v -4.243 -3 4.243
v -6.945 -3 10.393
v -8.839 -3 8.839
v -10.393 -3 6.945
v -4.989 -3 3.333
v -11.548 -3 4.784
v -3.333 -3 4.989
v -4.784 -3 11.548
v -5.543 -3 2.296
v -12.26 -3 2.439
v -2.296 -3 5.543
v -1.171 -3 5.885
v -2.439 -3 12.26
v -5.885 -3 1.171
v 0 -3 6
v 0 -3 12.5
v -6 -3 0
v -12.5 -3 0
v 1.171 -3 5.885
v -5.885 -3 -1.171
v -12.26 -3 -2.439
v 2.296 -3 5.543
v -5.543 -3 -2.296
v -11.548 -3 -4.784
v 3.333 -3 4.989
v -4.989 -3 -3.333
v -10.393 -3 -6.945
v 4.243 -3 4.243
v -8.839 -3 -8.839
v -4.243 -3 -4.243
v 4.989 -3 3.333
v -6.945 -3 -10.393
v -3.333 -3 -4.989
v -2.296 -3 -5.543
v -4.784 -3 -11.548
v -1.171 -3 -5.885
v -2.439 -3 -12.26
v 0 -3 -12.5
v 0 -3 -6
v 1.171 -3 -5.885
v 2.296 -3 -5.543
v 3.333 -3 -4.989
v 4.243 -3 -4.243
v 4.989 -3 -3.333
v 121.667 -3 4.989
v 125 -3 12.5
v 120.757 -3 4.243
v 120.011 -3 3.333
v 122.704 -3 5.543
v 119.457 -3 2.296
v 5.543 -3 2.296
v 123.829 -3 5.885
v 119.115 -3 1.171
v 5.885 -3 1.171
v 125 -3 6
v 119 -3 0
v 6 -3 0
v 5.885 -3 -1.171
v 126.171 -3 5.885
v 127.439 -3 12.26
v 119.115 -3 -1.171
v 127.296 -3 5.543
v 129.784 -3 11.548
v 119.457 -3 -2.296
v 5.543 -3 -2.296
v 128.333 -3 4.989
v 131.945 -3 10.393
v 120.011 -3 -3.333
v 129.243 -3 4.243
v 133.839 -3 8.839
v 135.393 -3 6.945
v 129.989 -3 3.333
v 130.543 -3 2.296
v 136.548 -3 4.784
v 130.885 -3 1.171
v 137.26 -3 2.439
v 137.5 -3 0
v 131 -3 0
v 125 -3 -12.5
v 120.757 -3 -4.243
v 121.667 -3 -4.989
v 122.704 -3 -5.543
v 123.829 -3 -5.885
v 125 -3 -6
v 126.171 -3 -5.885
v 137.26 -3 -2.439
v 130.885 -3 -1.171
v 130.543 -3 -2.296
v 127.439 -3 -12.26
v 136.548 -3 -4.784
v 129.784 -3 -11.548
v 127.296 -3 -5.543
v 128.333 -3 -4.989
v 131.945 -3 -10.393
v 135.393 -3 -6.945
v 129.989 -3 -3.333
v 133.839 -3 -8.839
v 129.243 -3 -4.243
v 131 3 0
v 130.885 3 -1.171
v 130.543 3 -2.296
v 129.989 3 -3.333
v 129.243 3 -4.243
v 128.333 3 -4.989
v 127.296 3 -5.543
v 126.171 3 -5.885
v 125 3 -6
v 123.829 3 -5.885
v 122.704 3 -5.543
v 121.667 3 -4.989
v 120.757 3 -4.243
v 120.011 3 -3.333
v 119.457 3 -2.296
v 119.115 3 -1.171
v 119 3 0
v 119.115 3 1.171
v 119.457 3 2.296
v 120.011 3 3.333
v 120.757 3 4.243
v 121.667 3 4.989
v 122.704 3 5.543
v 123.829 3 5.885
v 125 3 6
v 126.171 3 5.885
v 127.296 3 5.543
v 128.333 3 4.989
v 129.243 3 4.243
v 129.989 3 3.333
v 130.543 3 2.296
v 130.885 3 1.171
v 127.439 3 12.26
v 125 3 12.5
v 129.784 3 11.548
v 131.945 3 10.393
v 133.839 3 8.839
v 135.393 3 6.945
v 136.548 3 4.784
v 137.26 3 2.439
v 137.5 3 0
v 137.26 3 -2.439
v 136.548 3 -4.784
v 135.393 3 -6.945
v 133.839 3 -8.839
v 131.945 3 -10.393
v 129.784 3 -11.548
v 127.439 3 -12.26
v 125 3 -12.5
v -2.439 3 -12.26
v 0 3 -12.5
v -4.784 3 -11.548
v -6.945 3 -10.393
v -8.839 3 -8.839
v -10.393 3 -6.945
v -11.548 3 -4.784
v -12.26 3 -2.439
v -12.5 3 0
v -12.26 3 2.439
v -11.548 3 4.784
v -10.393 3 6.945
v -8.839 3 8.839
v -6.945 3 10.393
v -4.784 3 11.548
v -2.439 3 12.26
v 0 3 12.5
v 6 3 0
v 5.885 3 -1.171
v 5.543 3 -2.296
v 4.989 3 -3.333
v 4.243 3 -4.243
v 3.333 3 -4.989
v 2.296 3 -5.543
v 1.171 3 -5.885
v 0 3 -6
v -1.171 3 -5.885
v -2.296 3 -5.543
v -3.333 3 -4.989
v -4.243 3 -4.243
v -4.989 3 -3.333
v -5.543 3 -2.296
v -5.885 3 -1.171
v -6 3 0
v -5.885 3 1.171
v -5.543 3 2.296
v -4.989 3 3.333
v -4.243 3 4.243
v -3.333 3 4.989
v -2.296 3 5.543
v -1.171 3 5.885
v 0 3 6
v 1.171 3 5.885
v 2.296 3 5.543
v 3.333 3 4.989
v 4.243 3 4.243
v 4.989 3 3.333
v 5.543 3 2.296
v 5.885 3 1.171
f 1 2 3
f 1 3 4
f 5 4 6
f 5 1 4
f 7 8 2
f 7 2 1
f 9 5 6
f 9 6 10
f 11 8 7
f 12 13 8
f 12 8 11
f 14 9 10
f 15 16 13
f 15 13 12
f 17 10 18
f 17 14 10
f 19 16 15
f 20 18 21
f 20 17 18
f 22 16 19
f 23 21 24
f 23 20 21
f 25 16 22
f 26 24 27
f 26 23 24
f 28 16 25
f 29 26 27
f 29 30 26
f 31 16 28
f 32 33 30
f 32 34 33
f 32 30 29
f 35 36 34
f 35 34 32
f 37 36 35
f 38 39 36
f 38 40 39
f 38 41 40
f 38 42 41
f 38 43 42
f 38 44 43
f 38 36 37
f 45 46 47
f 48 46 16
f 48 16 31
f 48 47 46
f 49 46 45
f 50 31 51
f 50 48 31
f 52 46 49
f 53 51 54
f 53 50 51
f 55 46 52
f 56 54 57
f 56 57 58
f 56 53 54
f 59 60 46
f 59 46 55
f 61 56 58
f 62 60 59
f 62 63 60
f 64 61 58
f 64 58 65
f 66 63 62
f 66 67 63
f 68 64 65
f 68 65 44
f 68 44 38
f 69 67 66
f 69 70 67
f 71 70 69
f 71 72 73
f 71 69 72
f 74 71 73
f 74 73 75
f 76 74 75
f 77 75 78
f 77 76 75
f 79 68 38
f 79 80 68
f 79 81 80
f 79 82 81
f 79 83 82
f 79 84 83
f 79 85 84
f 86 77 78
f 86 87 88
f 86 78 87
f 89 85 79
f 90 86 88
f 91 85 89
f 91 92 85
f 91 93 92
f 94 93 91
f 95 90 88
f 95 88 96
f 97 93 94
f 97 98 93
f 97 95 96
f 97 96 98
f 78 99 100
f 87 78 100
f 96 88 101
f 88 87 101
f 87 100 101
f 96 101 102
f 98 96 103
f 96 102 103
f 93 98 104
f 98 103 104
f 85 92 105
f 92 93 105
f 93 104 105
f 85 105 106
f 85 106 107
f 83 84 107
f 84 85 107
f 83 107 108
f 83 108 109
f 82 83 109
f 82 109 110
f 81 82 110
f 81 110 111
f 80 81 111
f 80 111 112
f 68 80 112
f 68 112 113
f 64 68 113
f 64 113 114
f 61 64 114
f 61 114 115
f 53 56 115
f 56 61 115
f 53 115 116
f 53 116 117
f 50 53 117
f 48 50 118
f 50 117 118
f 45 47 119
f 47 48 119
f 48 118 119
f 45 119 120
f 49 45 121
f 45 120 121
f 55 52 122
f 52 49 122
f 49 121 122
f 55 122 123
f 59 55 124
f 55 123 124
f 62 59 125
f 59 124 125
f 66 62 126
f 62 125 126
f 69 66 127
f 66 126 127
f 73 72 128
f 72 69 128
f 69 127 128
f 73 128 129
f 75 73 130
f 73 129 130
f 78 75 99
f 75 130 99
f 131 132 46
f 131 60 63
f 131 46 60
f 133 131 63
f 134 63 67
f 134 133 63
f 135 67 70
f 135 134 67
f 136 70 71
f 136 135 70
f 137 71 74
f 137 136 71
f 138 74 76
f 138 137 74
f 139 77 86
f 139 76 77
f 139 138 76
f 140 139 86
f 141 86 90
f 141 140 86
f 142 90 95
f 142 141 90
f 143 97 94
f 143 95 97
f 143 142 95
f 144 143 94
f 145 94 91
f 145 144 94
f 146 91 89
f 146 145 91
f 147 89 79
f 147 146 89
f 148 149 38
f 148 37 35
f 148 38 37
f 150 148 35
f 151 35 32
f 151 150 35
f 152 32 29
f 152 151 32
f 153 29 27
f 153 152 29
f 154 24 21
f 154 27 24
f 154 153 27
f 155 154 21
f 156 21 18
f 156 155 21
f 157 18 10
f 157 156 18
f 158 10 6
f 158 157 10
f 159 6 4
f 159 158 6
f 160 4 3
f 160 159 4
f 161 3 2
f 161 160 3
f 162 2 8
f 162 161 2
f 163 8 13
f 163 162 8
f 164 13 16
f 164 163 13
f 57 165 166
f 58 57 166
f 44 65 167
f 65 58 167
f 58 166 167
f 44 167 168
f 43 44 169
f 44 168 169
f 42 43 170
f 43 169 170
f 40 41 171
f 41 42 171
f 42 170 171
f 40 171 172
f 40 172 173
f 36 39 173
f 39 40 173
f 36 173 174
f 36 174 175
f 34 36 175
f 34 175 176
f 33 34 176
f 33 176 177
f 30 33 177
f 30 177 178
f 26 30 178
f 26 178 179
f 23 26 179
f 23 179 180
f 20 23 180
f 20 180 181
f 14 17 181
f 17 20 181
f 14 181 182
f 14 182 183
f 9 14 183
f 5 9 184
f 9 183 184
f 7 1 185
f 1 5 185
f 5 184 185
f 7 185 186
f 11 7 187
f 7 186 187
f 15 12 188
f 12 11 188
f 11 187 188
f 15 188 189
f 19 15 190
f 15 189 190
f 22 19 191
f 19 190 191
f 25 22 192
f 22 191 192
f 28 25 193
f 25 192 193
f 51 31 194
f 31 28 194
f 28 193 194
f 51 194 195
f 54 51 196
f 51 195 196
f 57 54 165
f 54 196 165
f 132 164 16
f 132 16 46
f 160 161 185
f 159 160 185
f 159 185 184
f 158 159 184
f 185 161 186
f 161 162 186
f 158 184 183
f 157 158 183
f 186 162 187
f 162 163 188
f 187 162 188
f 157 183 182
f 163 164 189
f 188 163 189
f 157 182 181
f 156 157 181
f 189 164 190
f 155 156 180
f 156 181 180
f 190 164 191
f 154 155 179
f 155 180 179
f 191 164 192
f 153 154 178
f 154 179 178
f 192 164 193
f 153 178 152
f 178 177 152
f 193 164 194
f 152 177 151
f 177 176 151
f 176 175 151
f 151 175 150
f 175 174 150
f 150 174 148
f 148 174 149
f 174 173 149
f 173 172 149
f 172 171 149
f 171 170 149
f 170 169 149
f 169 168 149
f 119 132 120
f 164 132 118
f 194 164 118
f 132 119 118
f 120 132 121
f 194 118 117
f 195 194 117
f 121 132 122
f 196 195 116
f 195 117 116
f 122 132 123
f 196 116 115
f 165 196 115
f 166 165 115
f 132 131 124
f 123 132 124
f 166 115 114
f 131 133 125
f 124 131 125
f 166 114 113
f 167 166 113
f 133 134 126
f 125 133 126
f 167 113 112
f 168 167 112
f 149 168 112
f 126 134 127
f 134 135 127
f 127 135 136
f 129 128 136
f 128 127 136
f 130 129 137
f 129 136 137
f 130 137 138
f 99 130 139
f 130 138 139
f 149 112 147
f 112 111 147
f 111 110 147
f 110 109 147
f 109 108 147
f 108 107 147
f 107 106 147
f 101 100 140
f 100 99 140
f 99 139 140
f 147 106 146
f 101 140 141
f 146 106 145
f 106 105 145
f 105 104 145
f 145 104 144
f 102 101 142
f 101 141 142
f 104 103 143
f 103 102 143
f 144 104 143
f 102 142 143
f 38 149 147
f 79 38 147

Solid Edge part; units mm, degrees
sketch "Sketch1" plane through (0, 0, 0) normal (0, -1, 0) x (1, 0, 0)
  line L0 (0, -12.5) -> (125, -12.4999)
  line L1 (0, 12.5) -> (125, 12.4999)
  arc A0 (125, -12.4999) -> (125, 12.4999) centre (125, 0) ccw
  arc A1 (0, 12.5) -> (0, -12.5) centre (0, 0) ccw
  circle A2 centre (125, 0) radius 6
  circle A3 centre (0, 0) radius 6
extrude "Protrusion1" add sketch "Sketch1" along normal mid plane 6
properties part number "7" material "Fe 410 W"
